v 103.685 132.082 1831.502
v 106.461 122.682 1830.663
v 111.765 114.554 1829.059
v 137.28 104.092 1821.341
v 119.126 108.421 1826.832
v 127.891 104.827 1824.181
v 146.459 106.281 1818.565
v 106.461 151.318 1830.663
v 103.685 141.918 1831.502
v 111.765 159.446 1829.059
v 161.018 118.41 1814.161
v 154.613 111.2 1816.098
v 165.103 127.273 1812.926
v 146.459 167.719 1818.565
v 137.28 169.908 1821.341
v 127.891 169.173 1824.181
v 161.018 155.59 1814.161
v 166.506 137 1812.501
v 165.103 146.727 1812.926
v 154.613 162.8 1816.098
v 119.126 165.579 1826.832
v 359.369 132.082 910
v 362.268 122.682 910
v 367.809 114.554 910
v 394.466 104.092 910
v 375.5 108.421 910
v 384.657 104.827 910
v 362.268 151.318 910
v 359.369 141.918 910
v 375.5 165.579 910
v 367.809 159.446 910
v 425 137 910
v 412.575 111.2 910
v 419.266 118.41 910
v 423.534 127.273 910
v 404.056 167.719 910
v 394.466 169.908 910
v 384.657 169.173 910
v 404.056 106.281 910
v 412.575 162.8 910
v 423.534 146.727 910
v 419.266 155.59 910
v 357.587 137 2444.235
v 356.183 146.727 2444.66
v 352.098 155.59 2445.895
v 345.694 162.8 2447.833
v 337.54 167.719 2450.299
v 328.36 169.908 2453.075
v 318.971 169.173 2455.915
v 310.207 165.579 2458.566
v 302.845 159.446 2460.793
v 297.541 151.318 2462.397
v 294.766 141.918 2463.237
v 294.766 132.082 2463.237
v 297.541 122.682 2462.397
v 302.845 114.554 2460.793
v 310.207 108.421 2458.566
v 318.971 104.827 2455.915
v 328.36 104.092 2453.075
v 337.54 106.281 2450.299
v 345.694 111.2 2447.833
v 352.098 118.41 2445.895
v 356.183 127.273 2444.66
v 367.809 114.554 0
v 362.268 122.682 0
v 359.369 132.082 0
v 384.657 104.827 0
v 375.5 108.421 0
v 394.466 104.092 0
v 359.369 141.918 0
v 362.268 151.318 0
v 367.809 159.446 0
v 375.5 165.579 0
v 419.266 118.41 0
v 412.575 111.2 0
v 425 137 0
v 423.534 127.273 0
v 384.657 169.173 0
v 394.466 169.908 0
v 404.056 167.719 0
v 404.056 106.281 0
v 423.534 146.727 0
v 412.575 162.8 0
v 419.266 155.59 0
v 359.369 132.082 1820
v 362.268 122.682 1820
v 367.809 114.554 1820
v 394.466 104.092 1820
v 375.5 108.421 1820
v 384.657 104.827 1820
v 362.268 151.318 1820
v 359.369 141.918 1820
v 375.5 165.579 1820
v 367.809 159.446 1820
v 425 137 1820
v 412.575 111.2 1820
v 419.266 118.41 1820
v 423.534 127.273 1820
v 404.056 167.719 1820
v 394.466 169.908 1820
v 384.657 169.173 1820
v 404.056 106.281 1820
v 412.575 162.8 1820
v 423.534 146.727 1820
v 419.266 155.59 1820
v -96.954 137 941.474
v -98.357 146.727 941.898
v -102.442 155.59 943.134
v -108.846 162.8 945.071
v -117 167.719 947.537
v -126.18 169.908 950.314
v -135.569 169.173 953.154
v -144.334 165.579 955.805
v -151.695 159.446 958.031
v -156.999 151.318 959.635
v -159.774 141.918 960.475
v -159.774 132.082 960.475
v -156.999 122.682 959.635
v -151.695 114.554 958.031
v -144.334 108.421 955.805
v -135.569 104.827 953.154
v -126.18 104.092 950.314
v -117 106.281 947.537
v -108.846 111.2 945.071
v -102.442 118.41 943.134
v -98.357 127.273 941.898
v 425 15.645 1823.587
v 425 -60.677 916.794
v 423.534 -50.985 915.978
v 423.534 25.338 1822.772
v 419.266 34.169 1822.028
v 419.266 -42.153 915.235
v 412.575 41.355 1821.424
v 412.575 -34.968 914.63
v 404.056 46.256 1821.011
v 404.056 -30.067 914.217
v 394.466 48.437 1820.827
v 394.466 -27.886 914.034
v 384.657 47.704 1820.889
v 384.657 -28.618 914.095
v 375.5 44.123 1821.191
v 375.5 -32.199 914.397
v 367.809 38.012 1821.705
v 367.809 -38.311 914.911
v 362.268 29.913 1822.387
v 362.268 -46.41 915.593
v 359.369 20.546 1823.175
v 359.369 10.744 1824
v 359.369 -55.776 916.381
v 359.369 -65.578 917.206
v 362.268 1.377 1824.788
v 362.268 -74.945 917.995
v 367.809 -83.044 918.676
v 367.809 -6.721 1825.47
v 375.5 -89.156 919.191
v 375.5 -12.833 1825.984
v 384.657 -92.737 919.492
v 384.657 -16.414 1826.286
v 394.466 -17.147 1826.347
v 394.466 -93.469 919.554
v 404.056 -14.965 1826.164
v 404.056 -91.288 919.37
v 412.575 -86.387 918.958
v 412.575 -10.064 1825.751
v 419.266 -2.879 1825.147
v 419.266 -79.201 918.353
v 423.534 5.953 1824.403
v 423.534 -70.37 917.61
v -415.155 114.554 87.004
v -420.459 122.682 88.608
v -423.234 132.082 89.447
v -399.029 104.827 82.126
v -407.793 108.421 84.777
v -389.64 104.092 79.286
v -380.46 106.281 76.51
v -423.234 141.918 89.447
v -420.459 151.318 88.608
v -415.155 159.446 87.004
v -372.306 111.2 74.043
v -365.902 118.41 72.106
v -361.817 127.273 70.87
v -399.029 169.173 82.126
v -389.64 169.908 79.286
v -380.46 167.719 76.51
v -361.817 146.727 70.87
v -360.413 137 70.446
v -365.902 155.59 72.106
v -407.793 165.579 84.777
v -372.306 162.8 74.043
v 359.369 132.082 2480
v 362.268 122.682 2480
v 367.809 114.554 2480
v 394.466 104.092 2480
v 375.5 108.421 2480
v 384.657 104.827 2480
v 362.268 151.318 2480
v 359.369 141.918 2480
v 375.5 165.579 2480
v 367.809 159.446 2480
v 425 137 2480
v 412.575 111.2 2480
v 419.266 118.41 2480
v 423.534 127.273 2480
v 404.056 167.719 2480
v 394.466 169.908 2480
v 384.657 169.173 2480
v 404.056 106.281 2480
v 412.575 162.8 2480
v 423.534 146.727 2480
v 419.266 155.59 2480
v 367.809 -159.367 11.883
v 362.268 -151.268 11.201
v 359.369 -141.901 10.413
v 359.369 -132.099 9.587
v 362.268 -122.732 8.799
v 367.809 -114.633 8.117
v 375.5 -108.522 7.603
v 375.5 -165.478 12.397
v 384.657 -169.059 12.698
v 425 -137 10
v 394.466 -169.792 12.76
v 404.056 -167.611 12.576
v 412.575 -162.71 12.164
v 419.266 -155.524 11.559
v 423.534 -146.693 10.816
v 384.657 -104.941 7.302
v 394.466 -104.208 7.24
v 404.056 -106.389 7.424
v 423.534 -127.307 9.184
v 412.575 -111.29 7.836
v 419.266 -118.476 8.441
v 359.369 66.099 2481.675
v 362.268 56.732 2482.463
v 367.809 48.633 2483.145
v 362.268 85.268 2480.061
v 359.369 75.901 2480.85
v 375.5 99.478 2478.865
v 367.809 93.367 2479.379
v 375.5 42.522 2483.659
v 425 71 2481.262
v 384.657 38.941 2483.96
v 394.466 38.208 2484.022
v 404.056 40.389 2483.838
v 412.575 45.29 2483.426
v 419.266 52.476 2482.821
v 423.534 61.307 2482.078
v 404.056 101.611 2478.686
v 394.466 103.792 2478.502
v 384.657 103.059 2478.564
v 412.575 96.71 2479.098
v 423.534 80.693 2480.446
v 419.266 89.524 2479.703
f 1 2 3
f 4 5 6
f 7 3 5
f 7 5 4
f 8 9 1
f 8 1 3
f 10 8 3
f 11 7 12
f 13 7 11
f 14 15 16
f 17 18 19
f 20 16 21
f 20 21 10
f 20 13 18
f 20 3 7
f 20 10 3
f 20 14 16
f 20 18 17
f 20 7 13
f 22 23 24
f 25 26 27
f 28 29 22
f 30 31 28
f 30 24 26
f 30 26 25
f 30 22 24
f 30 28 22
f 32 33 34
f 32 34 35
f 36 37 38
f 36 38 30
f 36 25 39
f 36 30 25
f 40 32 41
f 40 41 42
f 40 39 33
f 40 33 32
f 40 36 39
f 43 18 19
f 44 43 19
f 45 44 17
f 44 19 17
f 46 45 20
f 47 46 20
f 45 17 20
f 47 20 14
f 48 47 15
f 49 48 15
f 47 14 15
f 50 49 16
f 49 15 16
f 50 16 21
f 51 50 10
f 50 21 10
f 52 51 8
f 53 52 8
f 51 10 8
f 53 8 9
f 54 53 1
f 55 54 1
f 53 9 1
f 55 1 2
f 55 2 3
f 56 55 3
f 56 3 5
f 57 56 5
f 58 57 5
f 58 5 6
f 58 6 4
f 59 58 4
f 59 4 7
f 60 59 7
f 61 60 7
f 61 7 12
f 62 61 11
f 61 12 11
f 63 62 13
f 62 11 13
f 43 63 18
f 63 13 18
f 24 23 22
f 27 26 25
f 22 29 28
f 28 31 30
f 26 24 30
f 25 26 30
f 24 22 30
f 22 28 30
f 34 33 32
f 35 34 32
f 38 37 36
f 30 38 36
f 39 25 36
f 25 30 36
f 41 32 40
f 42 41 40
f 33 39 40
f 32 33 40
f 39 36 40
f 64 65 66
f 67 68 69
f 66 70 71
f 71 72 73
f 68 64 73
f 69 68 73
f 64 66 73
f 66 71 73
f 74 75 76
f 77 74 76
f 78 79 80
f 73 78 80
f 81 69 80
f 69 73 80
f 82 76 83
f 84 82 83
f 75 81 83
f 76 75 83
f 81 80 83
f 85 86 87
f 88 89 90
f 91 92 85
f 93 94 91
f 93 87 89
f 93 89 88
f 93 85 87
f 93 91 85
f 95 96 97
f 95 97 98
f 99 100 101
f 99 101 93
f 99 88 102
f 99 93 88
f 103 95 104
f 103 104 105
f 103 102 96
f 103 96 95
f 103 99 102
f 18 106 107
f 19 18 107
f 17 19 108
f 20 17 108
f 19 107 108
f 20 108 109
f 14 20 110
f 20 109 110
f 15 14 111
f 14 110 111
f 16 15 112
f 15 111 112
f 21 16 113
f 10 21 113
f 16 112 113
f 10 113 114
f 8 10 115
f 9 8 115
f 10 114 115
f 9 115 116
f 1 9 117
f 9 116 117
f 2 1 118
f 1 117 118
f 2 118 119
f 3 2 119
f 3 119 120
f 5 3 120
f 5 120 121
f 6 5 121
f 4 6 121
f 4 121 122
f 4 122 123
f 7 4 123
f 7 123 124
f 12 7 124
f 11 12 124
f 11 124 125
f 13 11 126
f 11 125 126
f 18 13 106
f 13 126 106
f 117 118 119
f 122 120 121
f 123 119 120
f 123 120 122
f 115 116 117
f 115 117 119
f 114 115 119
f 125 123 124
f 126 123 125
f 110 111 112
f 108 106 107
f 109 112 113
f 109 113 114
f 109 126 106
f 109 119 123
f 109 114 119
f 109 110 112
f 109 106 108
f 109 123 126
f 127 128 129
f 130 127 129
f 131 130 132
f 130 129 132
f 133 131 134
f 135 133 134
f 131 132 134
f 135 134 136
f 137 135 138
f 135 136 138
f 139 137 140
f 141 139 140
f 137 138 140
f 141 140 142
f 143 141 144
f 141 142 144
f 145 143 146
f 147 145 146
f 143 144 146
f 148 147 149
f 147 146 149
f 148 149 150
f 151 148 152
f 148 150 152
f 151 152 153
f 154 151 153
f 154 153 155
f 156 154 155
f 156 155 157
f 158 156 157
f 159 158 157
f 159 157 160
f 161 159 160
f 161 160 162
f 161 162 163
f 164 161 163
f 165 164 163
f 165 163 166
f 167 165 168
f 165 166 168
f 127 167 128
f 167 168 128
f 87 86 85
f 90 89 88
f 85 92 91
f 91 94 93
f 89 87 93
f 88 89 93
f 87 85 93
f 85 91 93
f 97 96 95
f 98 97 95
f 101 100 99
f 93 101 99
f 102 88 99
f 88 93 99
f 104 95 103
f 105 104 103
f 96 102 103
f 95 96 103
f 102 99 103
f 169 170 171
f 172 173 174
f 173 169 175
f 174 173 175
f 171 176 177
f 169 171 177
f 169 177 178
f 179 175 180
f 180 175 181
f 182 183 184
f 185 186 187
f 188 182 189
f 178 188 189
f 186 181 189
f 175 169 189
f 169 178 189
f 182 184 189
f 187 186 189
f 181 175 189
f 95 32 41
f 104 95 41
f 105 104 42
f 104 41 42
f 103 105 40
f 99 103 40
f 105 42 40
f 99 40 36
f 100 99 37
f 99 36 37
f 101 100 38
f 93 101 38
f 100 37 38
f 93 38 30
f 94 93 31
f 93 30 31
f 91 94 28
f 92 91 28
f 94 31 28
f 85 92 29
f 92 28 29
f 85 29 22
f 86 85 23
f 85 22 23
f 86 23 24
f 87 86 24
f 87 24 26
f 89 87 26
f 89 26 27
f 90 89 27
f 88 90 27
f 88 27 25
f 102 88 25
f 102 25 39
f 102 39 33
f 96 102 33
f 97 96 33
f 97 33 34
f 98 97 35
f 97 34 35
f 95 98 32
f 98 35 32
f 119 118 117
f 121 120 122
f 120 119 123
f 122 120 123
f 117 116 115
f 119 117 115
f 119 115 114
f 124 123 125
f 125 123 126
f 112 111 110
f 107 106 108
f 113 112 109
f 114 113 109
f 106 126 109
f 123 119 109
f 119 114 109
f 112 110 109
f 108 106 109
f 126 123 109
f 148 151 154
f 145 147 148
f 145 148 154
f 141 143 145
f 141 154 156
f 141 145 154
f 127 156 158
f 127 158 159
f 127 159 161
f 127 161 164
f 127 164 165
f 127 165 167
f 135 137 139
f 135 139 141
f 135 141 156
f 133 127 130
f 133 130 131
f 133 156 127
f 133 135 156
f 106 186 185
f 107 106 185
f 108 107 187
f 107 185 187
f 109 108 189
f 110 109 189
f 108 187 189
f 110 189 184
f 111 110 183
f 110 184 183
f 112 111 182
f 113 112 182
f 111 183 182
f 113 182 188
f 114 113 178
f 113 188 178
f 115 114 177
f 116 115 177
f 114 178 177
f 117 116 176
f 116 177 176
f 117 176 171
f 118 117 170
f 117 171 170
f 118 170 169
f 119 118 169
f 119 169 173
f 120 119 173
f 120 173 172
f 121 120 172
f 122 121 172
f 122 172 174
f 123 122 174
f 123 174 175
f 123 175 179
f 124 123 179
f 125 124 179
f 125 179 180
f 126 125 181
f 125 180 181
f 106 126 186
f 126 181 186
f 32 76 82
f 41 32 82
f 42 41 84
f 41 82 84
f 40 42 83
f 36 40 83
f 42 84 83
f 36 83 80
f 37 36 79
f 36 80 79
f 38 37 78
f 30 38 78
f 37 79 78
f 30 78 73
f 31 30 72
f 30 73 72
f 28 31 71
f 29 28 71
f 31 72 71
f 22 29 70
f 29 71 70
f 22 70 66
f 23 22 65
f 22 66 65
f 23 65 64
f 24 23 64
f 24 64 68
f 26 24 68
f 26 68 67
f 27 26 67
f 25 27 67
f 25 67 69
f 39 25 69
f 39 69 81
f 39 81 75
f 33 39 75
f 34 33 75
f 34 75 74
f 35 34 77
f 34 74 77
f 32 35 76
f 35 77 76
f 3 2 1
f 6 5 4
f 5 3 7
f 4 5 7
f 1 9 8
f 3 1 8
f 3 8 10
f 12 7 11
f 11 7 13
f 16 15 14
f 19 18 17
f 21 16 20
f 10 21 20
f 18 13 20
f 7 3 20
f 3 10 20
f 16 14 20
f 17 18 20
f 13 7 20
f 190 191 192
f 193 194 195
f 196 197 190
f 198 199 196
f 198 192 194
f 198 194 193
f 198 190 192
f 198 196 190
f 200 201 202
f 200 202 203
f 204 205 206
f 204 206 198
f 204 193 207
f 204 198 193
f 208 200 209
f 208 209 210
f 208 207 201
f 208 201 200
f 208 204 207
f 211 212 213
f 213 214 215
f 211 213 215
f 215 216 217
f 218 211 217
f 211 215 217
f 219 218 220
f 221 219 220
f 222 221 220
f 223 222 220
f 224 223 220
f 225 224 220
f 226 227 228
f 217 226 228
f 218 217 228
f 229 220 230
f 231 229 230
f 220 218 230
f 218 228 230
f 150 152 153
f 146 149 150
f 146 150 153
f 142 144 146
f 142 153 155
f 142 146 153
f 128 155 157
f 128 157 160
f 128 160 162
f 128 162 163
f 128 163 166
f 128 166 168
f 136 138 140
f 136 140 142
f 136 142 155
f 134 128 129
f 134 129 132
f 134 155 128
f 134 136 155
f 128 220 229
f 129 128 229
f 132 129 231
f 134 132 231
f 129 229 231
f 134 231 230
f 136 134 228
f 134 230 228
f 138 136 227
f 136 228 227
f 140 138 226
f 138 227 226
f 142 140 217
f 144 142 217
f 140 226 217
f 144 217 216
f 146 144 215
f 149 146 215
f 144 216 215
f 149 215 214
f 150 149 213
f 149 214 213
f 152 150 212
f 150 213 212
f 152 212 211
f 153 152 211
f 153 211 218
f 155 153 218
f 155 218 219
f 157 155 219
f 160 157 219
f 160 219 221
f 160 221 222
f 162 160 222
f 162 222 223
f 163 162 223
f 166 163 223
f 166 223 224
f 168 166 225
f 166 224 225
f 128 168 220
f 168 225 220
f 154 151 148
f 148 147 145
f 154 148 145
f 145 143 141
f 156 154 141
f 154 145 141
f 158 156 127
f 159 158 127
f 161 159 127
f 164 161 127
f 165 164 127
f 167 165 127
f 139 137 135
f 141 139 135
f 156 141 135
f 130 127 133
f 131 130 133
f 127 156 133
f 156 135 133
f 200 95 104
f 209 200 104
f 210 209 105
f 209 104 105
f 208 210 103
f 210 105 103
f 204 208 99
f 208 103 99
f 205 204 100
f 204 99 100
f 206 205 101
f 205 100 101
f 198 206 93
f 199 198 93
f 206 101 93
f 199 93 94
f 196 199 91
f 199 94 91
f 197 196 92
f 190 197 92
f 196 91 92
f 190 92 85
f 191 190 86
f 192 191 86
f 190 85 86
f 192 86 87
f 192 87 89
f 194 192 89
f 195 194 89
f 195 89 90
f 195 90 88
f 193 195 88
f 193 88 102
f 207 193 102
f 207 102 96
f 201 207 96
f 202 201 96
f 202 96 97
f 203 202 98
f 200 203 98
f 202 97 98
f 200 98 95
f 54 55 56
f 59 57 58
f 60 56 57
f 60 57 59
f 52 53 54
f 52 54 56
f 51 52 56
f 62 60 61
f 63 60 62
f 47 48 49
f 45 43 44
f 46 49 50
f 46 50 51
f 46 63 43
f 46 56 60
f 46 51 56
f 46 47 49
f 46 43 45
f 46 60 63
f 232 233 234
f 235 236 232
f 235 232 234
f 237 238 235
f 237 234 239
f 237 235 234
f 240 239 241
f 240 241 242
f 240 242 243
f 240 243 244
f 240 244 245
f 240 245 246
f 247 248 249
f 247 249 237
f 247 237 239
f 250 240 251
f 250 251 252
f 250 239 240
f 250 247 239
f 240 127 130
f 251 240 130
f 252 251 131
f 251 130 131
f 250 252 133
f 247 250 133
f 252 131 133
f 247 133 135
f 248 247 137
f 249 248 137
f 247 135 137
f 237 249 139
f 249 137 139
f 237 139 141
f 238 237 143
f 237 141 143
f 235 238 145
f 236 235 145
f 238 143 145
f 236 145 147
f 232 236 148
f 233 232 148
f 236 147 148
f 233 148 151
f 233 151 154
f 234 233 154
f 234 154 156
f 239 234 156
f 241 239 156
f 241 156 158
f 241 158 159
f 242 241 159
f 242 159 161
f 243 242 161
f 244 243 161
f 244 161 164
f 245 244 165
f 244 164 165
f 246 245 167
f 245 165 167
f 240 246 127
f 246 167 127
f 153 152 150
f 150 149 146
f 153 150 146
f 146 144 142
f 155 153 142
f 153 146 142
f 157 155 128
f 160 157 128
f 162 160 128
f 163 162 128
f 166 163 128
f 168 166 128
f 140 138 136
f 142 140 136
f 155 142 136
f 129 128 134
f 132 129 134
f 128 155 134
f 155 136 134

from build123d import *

# Parameters (mm, degrees)
F10_R     = 33
F11_DEPTH = 910
F12_R     = 33
F13_DEPTH = 910
F14_R     = 33
F15_DEPTH = 910
F19_DEPTH = 910
F20_DEPTH = 910
F21_DEPTH = 910
F22_DEPTH = 660
F23_DEPTH = 660
F24_DEPTH = 660


with BuildPart() as f11:
    # F10 (on line) → F11 (new body)
    with BuildSketch(Plane(origin=(-10.6879139994, 0, -35.3354550137), x_dir=(0.9571731353, 0, -0.289516129), z_dir=(0.289516129, 0, 0.9571731353))):
        with Locations((-398.3731593786, 137)):
            Circle(F10_R)
    extrude(amount=F11_DEPTH)


with BuildPart() as f13:
    # F12 (on line) → F13 (new body)
    with BuildSketch(Plane(origin=(0, -0.1279498872, -1.520181238), x_dir=(1, 0, 0), z_dir=(0, 0.0838709677, 0.9964766233))):
        with Locations((392, -137.3560070686)):
            Circle(F12_R)
    extrude(amount=F13_DEPTH)


with BuildPart() as f15:
    # F14 (on Top) → F15 (new body)
    with BuildSketch(Plane.XY):
        with Locations((392, 137)):
            Circle(F14_R)
    extrude(amount=F15_DEPTH)


with BuildPart() as f19:
    # F19 (new): a face of the model
    f19_faces = [f11.part.faces().sort_by_distance(p)[0] for p in [
        (-128.5403225806, 137, 951.0275531659),
    ]]
    extrude(f19_faces, amount=F19_DEPTH)


with BuildPart() as f20:
    # F20 (new): a face of the model
    f20_faces = [f13.part.faces().sort_by_distance(p)[0] for p in [
        (392, -60.6774193548, 916.7937271969),
    ]]
    extrude(f20_faces, amount=F20_DEPTH)


with BuildPart() as f21:
    # F21 (new): a face of the model
    f21_faces = [f15.part.faces().sort_by_distance(p)[0] for p in [
        (392, 137, 910),
    ]]
    extrude(f21_faces, amount=F21_DEPTH)


with BuildPart() as f22:
    # F22 (new): a face of the model
    f22_faces = [f19.part.faces().sort_by_distance(p)[0] for p in [
        (134.9193548387, 137, 1822.0551063317),
    ]]
    extrude(f22_faces, amount=F22_DEPTH)


with BuildPart() as f23:
    # F23 (new): a face of the model
    f23_faces = [f20.part.faces().sort_by_distance(p)[0] for p in [
        (392, 15.6451612903, 1823.5874543938),
    ]]
    extrude(f23_faces, amount=F23_DEPTH)


with BuildPart() as f24:
    # F24 (new): a face of the model
    f24_faces = [f21.part.faces().sort_by_distance(p)[0] for p in [
        (392, 137, 1820),
    ]]
    extrude(f24_faces, amount=F24_DEPTH)


solid = Compound([f11.part, f13.part, f15.part, f19.part, f20.part, f21.part, f22.part, f23.part, f24.part])
